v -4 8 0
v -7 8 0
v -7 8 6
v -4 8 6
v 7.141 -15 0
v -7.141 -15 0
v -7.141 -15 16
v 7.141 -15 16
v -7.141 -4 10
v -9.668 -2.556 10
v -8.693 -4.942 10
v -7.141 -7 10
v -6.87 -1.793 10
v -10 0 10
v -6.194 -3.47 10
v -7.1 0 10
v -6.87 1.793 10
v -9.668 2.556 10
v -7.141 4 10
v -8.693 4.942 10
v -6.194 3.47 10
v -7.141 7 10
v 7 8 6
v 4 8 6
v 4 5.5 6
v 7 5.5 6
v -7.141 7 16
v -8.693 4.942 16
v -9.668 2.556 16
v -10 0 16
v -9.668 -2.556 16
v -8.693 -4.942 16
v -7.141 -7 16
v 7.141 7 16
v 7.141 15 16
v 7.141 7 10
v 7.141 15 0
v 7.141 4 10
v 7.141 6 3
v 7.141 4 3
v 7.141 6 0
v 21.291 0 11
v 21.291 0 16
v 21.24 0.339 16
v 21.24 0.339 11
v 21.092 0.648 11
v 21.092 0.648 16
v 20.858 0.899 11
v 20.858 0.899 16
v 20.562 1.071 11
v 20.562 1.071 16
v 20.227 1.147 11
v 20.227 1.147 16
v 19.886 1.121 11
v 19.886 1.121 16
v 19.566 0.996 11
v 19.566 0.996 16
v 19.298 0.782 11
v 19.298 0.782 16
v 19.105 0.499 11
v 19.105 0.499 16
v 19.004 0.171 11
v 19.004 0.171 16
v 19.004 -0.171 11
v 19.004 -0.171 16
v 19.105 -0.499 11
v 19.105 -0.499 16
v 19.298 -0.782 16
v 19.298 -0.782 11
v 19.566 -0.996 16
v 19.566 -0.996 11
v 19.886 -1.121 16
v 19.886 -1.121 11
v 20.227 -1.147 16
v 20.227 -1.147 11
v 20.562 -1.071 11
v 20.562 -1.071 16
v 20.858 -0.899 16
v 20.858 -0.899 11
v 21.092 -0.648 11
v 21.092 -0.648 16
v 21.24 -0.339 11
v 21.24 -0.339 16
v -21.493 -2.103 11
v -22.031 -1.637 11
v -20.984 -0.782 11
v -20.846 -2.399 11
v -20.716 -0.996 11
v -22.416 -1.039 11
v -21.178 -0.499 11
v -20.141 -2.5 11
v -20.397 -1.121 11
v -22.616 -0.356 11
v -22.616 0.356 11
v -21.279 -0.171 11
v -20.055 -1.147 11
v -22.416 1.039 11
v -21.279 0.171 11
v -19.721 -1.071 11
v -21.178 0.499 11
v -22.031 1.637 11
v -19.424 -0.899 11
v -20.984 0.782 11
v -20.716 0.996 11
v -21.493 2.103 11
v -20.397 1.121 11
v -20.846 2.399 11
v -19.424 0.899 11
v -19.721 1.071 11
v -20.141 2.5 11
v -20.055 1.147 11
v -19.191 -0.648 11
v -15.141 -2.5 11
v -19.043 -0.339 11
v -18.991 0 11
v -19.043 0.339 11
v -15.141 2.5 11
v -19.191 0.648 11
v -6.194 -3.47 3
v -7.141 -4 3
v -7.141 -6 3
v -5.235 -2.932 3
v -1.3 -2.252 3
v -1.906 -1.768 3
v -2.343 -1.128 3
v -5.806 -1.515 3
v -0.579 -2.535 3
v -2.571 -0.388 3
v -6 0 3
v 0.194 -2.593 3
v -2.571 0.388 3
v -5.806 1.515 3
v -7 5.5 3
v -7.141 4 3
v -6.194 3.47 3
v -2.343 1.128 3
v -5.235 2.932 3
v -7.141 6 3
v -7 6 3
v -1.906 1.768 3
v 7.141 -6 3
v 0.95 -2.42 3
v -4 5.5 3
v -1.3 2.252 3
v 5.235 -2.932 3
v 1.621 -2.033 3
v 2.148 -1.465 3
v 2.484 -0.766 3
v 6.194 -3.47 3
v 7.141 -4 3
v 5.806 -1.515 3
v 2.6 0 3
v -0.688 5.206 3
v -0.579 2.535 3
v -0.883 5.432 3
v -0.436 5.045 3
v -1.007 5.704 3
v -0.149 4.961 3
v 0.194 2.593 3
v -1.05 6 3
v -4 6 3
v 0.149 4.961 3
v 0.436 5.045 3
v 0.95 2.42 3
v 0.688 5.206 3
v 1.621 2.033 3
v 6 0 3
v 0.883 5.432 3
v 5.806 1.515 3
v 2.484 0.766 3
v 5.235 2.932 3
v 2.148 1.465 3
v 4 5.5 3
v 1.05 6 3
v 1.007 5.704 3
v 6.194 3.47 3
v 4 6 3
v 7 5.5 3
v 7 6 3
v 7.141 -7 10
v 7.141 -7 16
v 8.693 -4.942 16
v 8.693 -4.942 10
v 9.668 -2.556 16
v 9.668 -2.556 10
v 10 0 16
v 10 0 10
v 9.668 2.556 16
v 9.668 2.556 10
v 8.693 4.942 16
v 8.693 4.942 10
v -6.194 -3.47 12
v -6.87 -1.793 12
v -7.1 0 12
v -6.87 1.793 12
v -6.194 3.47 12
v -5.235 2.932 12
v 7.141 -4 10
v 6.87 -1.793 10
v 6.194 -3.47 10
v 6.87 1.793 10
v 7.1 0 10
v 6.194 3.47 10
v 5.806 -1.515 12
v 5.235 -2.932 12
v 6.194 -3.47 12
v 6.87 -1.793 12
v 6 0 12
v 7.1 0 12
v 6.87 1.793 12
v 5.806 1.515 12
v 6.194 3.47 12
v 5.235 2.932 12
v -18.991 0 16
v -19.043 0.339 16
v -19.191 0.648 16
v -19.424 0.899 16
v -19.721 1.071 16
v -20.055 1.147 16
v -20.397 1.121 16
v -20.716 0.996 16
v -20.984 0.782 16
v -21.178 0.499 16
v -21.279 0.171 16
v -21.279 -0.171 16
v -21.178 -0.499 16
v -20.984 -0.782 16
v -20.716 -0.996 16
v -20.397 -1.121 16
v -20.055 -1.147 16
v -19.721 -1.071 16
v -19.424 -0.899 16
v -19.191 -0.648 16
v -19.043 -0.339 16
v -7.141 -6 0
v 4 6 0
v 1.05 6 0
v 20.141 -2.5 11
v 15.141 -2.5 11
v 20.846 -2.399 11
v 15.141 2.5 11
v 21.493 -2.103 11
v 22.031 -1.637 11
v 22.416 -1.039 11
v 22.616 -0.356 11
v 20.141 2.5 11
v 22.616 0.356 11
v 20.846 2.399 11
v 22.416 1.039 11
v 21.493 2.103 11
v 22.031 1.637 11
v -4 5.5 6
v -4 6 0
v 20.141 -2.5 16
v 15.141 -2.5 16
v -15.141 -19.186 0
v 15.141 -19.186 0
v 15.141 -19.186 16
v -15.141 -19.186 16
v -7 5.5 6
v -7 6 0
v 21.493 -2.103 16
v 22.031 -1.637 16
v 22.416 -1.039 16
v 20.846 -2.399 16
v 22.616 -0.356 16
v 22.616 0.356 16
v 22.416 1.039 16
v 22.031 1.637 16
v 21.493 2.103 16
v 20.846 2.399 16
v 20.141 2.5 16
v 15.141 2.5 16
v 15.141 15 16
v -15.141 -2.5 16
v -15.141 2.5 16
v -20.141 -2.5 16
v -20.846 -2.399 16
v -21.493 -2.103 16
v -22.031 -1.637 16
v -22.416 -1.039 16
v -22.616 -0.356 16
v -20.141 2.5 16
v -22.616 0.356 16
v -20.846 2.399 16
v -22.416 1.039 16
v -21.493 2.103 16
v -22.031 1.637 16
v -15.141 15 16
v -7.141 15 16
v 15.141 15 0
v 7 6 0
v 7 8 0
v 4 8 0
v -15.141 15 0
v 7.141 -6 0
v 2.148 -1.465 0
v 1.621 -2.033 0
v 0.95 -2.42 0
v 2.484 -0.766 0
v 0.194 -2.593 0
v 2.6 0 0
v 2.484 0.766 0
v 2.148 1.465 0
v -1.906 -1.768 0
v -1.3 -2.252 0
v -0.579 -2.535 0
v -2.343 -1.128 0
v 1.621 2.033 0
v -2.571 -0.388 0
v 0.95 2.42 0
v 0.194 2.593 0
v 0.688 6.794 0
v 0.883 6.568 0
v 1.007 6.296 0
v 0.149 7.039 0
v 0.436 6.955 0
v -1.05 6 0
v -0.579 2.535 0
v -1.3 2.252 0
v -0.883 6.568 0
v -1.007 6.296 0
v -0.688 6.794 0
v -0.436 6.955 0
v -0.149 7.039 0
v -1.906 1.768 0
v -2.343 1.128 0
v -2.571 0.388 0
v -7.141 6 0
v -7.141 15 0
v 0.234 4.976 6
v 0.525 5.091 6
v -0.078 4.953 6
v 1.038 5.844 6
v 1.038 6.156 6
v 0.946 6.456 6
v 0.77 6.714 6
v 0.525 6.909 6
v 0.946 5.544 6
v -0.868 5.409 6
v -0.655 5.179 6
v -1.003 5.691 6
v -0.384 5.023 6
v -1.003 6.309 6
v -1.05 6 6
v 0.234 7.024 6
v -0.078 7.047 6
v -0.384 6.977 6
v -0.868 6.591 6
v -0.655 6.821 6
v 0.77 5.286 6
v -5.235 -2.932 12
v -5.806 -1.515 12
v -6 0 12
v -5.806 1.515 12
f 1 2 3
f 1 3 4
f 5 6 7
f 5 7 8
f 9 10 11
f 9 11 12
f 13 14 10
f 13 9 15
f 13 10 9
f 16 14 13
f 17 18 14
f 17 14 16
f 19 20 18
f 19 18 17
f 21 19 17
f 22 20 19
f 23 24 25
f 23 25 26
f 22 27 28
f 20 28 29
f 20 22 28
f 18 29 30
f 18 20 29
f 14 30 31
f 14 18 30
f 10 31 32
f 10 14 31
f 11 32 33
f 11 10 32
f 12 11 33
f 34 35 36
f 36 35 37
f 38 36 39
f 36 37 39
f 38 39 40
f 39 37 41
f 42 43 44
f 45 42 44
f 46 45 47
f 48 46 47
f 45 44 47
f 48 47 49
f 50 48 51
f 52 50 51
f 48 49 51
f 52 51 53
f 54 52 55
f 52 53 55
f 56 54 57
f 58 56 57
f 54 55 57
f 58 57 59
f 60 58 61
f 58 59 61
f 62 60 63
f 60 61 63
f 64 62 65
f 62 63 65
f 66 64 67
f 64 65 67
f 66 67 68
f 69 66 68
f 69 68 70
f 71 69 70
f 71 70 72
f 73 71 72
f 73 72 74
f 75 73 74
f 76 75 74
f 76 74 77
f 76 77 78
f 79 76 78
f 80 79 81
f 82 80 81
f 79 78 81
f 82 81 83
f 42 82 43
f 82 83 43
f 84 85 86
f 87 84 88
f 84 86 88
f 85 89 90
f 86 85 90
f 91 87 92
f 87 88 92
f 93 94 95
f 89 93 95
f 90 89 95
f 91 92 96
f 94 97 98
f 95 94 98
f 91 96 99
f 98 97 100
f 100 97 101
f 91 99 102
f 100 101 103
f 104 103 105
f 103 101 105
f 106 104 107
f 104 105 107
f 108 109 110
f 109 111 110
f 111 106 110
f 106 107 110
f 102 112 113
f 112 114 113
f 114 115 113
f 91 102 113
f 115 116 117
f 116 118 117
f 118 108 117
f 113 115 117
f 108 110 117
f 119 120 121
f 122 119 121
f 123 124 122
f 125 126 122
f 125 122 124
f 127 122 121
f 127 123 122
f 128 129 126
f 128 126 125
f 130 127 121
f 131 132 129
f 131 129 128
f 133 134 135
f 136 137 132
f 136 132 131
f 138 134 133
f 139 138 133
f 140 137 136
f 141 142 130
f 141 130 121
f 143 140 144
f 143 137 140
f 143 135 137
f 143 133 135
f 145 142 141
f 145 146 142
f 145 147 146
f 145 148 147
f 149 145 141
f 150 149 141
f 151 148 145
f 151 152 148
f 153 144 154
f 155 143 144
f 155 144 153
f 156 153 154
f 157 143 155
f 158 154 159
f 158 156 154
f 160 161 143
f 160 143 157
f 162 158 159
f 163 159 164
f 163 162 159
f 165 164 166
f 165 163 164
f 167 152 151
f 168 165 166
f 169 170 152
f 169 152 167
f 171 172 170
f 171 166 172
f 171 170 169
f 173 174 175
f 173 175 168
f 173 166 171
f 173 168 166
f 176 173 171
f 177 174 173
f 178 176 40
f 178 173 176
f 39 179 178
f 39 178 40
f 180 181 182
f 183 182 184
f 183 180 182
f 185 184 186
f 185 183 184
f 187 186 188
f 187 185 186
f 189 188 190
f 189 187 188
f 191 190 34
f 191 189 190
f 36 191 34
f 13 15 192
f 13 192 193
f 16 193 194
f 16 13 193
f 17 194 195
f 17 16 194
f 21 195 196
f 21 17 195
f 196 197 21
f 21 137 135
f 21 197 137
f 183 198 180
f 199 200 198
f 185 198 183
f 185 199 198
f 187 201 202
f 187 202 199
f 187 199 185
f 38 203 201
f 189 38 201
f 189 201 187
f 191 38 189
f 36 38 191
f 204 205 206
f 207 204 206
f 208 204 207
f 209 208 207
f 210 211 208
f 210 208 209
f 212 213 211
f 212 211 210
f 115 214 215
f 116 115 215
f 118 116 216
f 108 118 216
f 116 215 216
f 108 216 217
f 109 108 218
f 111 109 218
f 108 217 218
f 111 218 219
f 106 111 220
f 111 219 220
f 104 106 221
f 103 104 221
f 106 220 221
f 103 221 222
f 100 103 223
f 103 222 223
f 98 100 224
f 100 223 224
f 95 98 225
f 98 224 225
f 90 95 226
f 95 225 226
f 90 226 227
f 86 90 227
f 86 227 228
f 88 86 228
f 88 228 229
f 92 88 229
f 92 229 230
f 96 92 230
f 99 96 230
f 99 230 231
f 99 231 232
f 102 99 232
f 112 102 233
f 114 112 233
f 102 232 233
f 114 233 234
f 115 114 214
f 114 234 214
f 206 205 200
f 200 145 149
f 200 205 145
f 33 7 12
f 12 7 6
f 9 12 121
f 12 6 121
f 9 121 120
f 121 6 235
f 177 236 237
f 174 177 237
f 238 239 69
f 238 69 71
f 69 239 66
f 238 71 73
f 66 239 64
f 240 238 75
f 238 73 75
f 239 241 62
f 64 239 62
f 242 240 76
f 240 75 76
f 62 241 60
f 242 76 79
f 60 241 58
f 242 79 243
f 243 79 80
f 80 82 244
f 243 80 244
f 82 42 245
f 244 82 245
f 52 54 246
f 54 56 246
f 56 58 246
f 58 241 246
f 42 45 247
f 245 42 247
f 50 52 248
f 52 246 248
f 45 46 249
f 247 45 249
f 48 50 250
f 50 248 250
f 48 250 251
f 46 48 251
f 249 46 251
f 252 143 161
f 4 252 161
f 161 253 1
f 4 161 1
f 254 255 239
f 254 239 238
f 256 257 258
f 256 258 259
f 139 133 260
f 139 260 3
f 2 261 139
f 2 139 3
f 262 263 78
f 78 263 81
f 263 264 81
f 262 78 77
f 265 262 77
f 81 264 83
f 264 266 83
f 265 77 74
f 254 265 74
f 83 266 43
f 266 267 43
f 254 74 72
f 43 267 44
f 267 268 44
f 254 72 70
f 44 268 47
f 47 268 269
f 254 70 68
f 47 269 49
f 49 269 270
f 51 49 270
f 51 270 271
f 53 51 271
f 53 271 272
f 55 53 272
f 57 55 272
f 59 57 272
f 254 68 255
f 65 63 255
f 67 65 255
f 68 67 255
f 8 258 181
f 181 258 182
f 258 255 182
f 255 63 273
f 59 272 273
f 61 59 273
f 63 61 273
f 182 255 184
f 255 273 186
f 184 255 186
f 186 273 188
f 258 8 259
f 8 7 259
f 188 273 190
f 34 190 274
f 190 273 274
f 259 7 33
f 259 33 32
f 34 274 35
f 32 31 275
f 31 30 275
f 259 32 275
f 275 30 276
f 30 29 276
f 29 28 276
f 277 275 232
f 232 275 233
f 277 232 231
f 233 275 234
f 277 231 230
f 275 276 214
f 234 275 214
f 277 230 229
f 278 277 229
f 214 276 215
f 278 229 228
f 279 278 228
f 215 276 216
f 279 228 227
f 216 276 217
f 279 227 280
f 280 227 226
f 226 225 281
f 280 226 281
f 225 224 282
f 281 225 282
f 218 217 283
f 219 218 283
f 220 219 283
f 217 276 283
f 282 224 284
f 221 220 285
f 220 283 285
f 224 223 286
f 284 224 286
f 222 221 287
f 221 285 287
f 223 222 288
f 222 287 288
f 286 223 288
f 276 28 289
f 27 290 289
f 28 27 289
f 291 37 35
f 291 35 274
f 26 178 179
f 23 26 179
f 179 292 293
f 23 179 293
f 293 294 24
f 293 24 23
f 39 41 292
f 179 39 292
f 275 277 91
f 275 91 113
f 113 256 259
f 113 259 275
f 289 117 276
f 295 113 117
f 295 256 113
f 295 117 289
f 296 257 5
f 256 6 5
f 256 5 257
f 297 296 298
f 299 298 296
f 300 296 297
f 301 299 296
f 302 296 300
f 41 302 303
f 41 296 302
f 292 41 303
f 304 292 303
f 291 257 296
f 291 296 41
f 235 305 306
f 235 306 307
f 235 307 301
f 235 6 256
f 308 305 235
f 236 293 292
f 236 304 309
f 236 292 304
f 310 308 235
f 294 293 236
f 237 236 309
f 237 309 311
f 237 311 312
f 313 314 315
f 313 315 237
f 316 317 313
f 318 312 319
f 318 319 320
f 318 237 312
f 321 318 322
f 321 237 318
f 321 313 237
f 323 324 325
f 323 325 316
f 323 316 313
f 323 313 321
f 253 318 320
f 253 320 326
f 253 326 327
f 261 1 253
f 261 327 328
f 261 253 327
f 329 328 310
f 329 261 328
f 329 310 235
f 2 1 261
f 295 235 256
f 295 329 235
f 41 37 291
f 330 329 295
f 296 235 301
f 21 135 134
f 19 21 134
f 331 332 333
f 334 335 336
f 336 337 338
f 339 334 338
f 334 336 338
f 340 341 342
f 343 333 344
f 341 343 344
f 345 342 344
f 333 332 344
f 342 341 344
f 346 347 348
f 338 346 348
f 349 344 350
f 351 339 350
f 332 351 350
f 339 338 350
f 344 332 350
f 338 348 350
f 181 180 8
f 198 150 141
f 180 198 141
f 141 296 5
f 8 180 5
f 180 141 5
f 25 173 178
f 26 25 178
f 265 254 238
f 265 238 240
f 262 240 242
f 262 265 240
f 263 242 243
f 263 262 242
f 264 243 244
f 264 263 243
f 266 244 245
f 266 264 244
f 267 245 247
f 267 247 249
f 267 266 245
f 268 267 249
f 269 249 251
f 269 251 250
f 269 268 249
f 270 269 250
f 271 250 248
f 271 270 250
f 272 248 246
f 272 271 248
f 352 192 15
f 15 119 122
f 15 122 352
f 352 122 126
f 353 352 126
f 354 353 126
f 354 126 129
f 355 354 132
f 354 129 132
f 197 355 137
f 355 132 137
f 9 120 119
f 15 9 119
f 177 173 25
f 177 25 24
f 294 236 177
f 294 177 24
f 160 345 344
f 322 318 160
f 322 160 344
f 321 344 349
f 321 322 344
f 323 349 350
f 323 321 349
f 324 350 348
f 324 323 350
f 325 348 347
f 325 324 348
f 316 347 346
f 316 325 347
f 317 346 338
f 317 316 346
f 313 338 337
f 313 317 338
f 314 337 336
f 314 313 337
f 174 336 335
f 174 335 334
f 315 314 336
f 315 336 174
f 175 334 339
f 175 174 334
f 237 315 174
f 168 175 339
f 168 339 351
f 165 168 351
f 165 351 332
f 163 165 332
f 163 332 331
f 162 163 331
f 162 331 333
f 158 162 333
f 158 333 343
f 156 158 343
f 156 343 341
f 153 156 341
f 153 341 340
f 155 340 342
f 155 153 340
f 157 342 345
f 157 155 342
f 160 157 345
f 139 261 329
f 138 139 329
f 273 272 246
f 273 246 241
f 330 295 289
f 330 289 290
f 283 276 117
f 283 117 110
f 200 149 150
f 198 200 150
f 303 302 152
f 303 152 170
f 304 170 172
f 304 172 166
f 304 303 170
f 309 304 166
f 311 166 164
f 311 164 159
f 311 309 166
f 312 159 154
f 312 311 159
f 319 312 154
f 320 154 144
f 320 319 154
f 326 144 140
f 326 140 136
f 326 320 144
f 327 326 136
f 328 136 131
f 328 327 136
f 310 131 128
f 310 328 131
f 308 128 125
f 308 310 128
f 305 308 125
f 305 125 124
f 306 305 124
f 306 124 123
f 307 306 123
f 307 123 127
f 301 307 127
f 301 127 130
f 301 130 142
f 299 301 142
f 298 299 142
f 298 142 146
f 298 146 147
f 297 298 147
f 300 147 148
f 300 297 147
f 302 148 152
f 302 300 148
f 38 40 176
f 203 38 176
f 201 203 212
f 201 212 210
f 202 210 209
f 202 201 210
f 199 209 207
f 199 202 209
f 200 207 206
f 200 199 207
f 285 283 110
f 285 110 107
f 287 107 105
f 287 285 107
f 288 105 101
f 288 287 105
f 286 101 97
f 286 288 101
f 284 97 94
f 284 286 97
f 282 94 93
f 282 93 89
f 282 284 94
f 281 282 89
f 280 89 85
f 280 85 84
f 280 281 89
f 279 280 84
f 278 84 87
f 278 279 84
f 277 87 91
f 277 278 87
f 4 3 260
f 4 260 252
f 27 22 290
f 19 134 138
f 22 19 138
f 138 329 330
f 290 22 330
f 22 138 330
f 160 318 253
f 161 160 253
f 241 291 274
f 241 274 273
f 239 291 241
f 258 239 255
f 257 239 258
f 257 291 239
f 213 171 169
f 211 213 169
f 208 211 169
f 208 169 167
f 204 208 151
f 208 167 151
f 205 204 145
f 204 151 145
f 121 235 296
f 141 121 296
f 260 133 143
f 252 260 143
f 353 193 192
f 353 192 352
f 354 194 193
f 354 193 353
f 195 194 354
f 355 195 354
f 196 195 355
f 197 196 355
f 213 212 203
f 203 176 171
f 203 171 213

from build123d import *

# Parameters (mm, degrees)
EXTRUDE_2_DEPTH     = 16
SKETCH_1_3_R        = 2.6
EXTRUDE_3_DEPTH     = 3
EXTRUDE_START       = 16
SKETCH_1_6_R        = 1.15
EXTRUDE_4_DEPTH     = 5
CUT_EXTRUDE_START   = 10
CUT_EXTRUDE_1_DEPTH = 13
CUT_EXTRUDE_START_2 = 12
CUT_EXTRUDE_2_DEPTH = 13
SKETCH_3_R          = 1.05
EXTRUDE_5_DEPTH     = 6
EXTRUDE_START_2     = -3
SKETCH_4_W          = 3
SKETCH_4_H          = 2.5
EXTRUDE_7_DEPTH     = 6


with BuildPart() as part:
    # 草图1 → 凸台-拉伸2 (new body)
    with BuildSketch(Plane.XY):
        with BuildLine():
            ThreePointArc((-7.141428429, 7), (-10, 0), (-7.141428429, -7))
            Line((-7.141428429, -7), (-7.141428429, -15))
            Line((-7.141428429, -15), (-4, -15))
            Line((-4, -15), (4, -15))
            Line((4, -15), (7.141428429, -15))
            Line((7.141428429, -15), (7.141428429, -7))
            ThreePointArc((7.141428429, -7), (10, 0), (7.141428429, 7))
            Line((7.141428429, 7), (7.141428429, 15))
            Line((7.141428429, 15), (15.141428429, 15))
            Line((15.141428429, 15), (15.141428429, -19.186046512))
            Line((15.141428429, -19.186046512), (-15.141428429, -19.186046512))
            Line((-15.141428429, -19.186046512), (-15.141428429, 15))
            Line((-15.141428429, 15), (-7.141428429, 15))
            Line((-7.141428429, 15), (-7.141428429, 7))
        make_face()
        with BuildLine():
            Line((-7.141428429, 4), (-7.141428429, 6))
            Line((-7.141428429, 6), (-7.141428429, 7))
            ThreePointArc((-7.141428429, 7), (-10, 0), (-7.141428429, -7))
            Line((-7.141428429, -7), (-7.141428429, -6))
            Line((-7.141428429, -6), (-7.141428429, -4))
            Line((-7.141428429, -4), (-6.194496835, -3.46961222))
            ThreePointArc((-6.194496835, -3.46961222), (-7.1, 0), (-6.194496835, 3.46961222))
            Line((-6.194496835, 3.46961222), (-7.141428429, 4))
        make_face()
        with BuildLine():
            Line((-5.234786058, 2.932066665), (-6.194496835, 3.46961222))
            ThreePointArc((-6.194496835, 3.46961222), (-7.1, 0), (-6.194496835, -3.46961222))
            Line((-6.194496835, -3.46961222), (-5.234786058, -2.932066665))
            ThreePointArc((-5.234786058, -2.932066665), (-6, 0), (-5.234786058, 2.932066665))
        make_face()
        with BuildLine():
            ThreePointArc((6.194496835, -3.46961222), (7.1, 0), (6.194496835, 3.46961222))
            Line((6.194496835, 3.46961222), (5.234786058, 2.932066665))
            ThreePointArc((5.234786058, 2.932066665), (6, 0), (5.234786058, -2.932066665))
            Line((5.234786058, -2.932066665), (6.194496835, -3.46961222))
        make_face()
        with BuildLine():
            ThreePointArc((7.141428429, -7), (10, 0), (7.141428429, 7))
            Line((7.141428429, 7), (7.141428429, 6))
            Line((7.141428429, 6), (7.141428429, 4))
            Line((7.141428429, 4), (6.194496835, 3.46961222))
            ThreePointArc((6.194496835, 3.46961222), (7.1, 0), (6.194496835, -3.46961222))
            Line((6.194496835, -3.46961222), (7.141428429, -4))
            Line((7.141428429, -4), (7.141428429, -6))
            Line((7.141428429, -6), (7.141428429, -7))
        make_face()
    extrude(amount=EXTRUDE_2_DEPTH)

    # 草图1<3> → 凸台-拉伸3 (add)
    with BuildSketch(Plane.XY):
        with BuildLine():
            Line((7.141428429, 4), (7.141428429, 6))
            Line((7.141428429, 6), (-7.141428429, 6))
            Line((-7.141428429, 6), (-7.141428429, 4))
            Line((-7.141428429, 4), (-6.194496835, 3.46961222))
            Line((-6.194496835, 3.46961222), (-5.234786058, 2.932066665))
            ThreePointArc((-5.234786058, 2.932066665), (-6, 0), (-5.234786058, -2.932066665))
            Line((-5.234786058, -2.932066665), (-6.194496835, -3.46961222))
            Line((-6.194496835, -3.46961222), (-7.141428429, -4))
            Line((-7.141428429, -4), (-7.141428429, -6))
            Line((-7.141428429, -6), (7.141428429, -6))
            Line((7.141428429, -6), (7.141428429, -4))
            Line((7.141428429, -4), (6.194496835, -3.46961222))
            Line((6.194496835, -3.46961222), (5.234786058, -2.932066665))
            ThreePointArc((5.234786058, -2.932066665), (6, 0), (5.234786058, 2.932066665))
            Line((5.234786058, 2.932066665), (6.194496835, 3.46961222))
            Line((6.194496835, 3.46961222), (7.141428429, 4))
        make_face()
        Circle(SKETCH_1_3_R, mode=Mode.SUBTRACT)
    extrude(amount=EXTRUDE_3_DEPTH)

    # 草图1<6> → 凸台-拉伸4 (add)
    # profile 1 of 2: a face of its own
    with BuildSketch(Plane.XY.offset(EXTRUDE_START)):
        with BuildLine():
            Line((-15.141428429, -2.5), (-15.141428429, 2.5))
            Line((-15.141428429, 2.5), (-20.141428429, 2.5))
            ThreePointArc((-20.141428429, 2.5), (-22.641428429, 0), (-20.141428429, -2.5))
            Line((-20.141428429, -2.5), (-15.141428429, -2.5))
        make_face()
        with Locations((-20.141428429, 0)):
            Circle(SKETCH_1_6_R, mode=Mode.SUBTRACT)
    # profile 2 of 2: a face of its own
    with BuildSketch(Plane.XY.offset(EXTRUDE_START)):
        with BuildLine():
            Line((20.141428429, 2.5), (15.141428429, 2.5))
            Line((15.141428429, 2.5), (15.141428429, -2.5))
            Line((15.141428429, -2.5), (20.141428429, -2.5))
            ThreePointArc((20.141428429, -2.5), (22.641428429, 0), (20.141428429, 2.5))
        make_face()
        with Locations((20.141428429, 0)):
            Circle(SKETCH_1_6_R, mode=Mode.SUBTRACT)
    extrude(amount=-EXTRUDE_4_DEPTH)

    # 草图1<4> → 切除-拉伸1 (cut)
    with BuildSketch(Plane.XY.offset(CUT_EXTRUDE_START)):
        with BuildLine():
            Line((-7.141428429, 4), (-7.141428429, 6))
            Line((-7.141428429, 6), (-7.141428429, 7))
            ThreePointArc((-7.141428429, 7), (-10, 0), (-7.141428429, -7))
            Line((-7.141428429, -7), (-7.141428429, -6))
            Line((-7.141428429, -6), (-7.141428429, -4))
            Line((-7.141428429, -4), (-6.194496835, -3.46961222))
            ThreePointArc((-6.194496835, -3.46961222), (-7.1, 0), (-6.194496835, 3.46961222))
            Line((-6.194496835, 3.46961222), (-7.141428429, 4))
        make_face()
        with BuildLine():
            ThreePointArc((7.141428429, -7), (10, 0), (7.141428429, 7))
            Line((7.141428429, 7), (7.141428429, 6))
            Line((7.141428429, 6), (7.141428429, 4))
            Line((7.141428429, 4), (6.194496835, 3.46961222))
            ThreePointArc((6.194496835, 3.46961222), (7.1, 0), (6.194496835, -3.46961222))
            Line((6.194496835, -3.46961222), (7.141428429, -4))
            Line((7.141428429, -4), (7.141428429, -6))
            Line((7.141428429, -6), (7.141428429, -7))
        make_face()
    extrude(amount=CUT_EXTRUDE_1_DEPTH, mode=Mode.SUBTRACT)

    # 草图1<5> → 切除-拉伸2 (cut)
    with BuildSketch(Plane.XY.offset(CUT_EXTRUDE_START_2)):
        with BuildLine():
            Line((-5.234786058, 2.932066665), (-6.194496835, 3.46961222))
            ThreePointArc((-6.194496835, 3.46961222), (-7.1, 0), (-6.194496835, -3.46961222))
            Line((-6.194496835, -3.46961222), (-5.234786058, -2.932066665))
            ThreePointArc((-5.234786058, -2.932066665), (-6, 0), (-5.234786058, 2.932066665))
        make_face()
        with BuildLine():
            ThreePointArc((6.194496835, -3.46961222), (7.1, 0), (6.194496835, 3.46961222))
            Line((6.194496835, 3.46961222), (5.234786058, 2.932066665))
            ThreePointArc((5.234786058, 2.932066665), (6, 0), (5.234786058, -2.932066665))
            Line((5.234786058, -2.932066665), (6.194496835, -3.46961222))
        make_face()
    extrude(amount=CUT_EXTRUDE_2_DEPTH, mode=Mode.SUBTRACT)

    # 草图3 → 凸台-拉伸5 (add)
    with BuildSketch(Plane(origin=(0, 0, 0), x_dir=(-1, 0, 0), z_dir=(0, 0, -1))):
        with Locations((0, 6)):
            Circle(SKETCH_3_R)
    extrude(amount=-EXTRUDE_5_DEPTH)

    # 草图4 → 凸台-拉伸7 (add)
    with BuildSketch(Plane.XY.offset(3).offset(EXTRUDE_START_2)):
        with Locations((5.5, 6.75)):
            Rectangle(SKETCH_4_W, SKETCH_4_H)
        with Locations((-5.5, 6.75)):
            Rectangle(SKETCH_4_W, SKETCH_4_H)
    extrude(amount=EXTRUDE_7_DEPTH)


solid = part.part
